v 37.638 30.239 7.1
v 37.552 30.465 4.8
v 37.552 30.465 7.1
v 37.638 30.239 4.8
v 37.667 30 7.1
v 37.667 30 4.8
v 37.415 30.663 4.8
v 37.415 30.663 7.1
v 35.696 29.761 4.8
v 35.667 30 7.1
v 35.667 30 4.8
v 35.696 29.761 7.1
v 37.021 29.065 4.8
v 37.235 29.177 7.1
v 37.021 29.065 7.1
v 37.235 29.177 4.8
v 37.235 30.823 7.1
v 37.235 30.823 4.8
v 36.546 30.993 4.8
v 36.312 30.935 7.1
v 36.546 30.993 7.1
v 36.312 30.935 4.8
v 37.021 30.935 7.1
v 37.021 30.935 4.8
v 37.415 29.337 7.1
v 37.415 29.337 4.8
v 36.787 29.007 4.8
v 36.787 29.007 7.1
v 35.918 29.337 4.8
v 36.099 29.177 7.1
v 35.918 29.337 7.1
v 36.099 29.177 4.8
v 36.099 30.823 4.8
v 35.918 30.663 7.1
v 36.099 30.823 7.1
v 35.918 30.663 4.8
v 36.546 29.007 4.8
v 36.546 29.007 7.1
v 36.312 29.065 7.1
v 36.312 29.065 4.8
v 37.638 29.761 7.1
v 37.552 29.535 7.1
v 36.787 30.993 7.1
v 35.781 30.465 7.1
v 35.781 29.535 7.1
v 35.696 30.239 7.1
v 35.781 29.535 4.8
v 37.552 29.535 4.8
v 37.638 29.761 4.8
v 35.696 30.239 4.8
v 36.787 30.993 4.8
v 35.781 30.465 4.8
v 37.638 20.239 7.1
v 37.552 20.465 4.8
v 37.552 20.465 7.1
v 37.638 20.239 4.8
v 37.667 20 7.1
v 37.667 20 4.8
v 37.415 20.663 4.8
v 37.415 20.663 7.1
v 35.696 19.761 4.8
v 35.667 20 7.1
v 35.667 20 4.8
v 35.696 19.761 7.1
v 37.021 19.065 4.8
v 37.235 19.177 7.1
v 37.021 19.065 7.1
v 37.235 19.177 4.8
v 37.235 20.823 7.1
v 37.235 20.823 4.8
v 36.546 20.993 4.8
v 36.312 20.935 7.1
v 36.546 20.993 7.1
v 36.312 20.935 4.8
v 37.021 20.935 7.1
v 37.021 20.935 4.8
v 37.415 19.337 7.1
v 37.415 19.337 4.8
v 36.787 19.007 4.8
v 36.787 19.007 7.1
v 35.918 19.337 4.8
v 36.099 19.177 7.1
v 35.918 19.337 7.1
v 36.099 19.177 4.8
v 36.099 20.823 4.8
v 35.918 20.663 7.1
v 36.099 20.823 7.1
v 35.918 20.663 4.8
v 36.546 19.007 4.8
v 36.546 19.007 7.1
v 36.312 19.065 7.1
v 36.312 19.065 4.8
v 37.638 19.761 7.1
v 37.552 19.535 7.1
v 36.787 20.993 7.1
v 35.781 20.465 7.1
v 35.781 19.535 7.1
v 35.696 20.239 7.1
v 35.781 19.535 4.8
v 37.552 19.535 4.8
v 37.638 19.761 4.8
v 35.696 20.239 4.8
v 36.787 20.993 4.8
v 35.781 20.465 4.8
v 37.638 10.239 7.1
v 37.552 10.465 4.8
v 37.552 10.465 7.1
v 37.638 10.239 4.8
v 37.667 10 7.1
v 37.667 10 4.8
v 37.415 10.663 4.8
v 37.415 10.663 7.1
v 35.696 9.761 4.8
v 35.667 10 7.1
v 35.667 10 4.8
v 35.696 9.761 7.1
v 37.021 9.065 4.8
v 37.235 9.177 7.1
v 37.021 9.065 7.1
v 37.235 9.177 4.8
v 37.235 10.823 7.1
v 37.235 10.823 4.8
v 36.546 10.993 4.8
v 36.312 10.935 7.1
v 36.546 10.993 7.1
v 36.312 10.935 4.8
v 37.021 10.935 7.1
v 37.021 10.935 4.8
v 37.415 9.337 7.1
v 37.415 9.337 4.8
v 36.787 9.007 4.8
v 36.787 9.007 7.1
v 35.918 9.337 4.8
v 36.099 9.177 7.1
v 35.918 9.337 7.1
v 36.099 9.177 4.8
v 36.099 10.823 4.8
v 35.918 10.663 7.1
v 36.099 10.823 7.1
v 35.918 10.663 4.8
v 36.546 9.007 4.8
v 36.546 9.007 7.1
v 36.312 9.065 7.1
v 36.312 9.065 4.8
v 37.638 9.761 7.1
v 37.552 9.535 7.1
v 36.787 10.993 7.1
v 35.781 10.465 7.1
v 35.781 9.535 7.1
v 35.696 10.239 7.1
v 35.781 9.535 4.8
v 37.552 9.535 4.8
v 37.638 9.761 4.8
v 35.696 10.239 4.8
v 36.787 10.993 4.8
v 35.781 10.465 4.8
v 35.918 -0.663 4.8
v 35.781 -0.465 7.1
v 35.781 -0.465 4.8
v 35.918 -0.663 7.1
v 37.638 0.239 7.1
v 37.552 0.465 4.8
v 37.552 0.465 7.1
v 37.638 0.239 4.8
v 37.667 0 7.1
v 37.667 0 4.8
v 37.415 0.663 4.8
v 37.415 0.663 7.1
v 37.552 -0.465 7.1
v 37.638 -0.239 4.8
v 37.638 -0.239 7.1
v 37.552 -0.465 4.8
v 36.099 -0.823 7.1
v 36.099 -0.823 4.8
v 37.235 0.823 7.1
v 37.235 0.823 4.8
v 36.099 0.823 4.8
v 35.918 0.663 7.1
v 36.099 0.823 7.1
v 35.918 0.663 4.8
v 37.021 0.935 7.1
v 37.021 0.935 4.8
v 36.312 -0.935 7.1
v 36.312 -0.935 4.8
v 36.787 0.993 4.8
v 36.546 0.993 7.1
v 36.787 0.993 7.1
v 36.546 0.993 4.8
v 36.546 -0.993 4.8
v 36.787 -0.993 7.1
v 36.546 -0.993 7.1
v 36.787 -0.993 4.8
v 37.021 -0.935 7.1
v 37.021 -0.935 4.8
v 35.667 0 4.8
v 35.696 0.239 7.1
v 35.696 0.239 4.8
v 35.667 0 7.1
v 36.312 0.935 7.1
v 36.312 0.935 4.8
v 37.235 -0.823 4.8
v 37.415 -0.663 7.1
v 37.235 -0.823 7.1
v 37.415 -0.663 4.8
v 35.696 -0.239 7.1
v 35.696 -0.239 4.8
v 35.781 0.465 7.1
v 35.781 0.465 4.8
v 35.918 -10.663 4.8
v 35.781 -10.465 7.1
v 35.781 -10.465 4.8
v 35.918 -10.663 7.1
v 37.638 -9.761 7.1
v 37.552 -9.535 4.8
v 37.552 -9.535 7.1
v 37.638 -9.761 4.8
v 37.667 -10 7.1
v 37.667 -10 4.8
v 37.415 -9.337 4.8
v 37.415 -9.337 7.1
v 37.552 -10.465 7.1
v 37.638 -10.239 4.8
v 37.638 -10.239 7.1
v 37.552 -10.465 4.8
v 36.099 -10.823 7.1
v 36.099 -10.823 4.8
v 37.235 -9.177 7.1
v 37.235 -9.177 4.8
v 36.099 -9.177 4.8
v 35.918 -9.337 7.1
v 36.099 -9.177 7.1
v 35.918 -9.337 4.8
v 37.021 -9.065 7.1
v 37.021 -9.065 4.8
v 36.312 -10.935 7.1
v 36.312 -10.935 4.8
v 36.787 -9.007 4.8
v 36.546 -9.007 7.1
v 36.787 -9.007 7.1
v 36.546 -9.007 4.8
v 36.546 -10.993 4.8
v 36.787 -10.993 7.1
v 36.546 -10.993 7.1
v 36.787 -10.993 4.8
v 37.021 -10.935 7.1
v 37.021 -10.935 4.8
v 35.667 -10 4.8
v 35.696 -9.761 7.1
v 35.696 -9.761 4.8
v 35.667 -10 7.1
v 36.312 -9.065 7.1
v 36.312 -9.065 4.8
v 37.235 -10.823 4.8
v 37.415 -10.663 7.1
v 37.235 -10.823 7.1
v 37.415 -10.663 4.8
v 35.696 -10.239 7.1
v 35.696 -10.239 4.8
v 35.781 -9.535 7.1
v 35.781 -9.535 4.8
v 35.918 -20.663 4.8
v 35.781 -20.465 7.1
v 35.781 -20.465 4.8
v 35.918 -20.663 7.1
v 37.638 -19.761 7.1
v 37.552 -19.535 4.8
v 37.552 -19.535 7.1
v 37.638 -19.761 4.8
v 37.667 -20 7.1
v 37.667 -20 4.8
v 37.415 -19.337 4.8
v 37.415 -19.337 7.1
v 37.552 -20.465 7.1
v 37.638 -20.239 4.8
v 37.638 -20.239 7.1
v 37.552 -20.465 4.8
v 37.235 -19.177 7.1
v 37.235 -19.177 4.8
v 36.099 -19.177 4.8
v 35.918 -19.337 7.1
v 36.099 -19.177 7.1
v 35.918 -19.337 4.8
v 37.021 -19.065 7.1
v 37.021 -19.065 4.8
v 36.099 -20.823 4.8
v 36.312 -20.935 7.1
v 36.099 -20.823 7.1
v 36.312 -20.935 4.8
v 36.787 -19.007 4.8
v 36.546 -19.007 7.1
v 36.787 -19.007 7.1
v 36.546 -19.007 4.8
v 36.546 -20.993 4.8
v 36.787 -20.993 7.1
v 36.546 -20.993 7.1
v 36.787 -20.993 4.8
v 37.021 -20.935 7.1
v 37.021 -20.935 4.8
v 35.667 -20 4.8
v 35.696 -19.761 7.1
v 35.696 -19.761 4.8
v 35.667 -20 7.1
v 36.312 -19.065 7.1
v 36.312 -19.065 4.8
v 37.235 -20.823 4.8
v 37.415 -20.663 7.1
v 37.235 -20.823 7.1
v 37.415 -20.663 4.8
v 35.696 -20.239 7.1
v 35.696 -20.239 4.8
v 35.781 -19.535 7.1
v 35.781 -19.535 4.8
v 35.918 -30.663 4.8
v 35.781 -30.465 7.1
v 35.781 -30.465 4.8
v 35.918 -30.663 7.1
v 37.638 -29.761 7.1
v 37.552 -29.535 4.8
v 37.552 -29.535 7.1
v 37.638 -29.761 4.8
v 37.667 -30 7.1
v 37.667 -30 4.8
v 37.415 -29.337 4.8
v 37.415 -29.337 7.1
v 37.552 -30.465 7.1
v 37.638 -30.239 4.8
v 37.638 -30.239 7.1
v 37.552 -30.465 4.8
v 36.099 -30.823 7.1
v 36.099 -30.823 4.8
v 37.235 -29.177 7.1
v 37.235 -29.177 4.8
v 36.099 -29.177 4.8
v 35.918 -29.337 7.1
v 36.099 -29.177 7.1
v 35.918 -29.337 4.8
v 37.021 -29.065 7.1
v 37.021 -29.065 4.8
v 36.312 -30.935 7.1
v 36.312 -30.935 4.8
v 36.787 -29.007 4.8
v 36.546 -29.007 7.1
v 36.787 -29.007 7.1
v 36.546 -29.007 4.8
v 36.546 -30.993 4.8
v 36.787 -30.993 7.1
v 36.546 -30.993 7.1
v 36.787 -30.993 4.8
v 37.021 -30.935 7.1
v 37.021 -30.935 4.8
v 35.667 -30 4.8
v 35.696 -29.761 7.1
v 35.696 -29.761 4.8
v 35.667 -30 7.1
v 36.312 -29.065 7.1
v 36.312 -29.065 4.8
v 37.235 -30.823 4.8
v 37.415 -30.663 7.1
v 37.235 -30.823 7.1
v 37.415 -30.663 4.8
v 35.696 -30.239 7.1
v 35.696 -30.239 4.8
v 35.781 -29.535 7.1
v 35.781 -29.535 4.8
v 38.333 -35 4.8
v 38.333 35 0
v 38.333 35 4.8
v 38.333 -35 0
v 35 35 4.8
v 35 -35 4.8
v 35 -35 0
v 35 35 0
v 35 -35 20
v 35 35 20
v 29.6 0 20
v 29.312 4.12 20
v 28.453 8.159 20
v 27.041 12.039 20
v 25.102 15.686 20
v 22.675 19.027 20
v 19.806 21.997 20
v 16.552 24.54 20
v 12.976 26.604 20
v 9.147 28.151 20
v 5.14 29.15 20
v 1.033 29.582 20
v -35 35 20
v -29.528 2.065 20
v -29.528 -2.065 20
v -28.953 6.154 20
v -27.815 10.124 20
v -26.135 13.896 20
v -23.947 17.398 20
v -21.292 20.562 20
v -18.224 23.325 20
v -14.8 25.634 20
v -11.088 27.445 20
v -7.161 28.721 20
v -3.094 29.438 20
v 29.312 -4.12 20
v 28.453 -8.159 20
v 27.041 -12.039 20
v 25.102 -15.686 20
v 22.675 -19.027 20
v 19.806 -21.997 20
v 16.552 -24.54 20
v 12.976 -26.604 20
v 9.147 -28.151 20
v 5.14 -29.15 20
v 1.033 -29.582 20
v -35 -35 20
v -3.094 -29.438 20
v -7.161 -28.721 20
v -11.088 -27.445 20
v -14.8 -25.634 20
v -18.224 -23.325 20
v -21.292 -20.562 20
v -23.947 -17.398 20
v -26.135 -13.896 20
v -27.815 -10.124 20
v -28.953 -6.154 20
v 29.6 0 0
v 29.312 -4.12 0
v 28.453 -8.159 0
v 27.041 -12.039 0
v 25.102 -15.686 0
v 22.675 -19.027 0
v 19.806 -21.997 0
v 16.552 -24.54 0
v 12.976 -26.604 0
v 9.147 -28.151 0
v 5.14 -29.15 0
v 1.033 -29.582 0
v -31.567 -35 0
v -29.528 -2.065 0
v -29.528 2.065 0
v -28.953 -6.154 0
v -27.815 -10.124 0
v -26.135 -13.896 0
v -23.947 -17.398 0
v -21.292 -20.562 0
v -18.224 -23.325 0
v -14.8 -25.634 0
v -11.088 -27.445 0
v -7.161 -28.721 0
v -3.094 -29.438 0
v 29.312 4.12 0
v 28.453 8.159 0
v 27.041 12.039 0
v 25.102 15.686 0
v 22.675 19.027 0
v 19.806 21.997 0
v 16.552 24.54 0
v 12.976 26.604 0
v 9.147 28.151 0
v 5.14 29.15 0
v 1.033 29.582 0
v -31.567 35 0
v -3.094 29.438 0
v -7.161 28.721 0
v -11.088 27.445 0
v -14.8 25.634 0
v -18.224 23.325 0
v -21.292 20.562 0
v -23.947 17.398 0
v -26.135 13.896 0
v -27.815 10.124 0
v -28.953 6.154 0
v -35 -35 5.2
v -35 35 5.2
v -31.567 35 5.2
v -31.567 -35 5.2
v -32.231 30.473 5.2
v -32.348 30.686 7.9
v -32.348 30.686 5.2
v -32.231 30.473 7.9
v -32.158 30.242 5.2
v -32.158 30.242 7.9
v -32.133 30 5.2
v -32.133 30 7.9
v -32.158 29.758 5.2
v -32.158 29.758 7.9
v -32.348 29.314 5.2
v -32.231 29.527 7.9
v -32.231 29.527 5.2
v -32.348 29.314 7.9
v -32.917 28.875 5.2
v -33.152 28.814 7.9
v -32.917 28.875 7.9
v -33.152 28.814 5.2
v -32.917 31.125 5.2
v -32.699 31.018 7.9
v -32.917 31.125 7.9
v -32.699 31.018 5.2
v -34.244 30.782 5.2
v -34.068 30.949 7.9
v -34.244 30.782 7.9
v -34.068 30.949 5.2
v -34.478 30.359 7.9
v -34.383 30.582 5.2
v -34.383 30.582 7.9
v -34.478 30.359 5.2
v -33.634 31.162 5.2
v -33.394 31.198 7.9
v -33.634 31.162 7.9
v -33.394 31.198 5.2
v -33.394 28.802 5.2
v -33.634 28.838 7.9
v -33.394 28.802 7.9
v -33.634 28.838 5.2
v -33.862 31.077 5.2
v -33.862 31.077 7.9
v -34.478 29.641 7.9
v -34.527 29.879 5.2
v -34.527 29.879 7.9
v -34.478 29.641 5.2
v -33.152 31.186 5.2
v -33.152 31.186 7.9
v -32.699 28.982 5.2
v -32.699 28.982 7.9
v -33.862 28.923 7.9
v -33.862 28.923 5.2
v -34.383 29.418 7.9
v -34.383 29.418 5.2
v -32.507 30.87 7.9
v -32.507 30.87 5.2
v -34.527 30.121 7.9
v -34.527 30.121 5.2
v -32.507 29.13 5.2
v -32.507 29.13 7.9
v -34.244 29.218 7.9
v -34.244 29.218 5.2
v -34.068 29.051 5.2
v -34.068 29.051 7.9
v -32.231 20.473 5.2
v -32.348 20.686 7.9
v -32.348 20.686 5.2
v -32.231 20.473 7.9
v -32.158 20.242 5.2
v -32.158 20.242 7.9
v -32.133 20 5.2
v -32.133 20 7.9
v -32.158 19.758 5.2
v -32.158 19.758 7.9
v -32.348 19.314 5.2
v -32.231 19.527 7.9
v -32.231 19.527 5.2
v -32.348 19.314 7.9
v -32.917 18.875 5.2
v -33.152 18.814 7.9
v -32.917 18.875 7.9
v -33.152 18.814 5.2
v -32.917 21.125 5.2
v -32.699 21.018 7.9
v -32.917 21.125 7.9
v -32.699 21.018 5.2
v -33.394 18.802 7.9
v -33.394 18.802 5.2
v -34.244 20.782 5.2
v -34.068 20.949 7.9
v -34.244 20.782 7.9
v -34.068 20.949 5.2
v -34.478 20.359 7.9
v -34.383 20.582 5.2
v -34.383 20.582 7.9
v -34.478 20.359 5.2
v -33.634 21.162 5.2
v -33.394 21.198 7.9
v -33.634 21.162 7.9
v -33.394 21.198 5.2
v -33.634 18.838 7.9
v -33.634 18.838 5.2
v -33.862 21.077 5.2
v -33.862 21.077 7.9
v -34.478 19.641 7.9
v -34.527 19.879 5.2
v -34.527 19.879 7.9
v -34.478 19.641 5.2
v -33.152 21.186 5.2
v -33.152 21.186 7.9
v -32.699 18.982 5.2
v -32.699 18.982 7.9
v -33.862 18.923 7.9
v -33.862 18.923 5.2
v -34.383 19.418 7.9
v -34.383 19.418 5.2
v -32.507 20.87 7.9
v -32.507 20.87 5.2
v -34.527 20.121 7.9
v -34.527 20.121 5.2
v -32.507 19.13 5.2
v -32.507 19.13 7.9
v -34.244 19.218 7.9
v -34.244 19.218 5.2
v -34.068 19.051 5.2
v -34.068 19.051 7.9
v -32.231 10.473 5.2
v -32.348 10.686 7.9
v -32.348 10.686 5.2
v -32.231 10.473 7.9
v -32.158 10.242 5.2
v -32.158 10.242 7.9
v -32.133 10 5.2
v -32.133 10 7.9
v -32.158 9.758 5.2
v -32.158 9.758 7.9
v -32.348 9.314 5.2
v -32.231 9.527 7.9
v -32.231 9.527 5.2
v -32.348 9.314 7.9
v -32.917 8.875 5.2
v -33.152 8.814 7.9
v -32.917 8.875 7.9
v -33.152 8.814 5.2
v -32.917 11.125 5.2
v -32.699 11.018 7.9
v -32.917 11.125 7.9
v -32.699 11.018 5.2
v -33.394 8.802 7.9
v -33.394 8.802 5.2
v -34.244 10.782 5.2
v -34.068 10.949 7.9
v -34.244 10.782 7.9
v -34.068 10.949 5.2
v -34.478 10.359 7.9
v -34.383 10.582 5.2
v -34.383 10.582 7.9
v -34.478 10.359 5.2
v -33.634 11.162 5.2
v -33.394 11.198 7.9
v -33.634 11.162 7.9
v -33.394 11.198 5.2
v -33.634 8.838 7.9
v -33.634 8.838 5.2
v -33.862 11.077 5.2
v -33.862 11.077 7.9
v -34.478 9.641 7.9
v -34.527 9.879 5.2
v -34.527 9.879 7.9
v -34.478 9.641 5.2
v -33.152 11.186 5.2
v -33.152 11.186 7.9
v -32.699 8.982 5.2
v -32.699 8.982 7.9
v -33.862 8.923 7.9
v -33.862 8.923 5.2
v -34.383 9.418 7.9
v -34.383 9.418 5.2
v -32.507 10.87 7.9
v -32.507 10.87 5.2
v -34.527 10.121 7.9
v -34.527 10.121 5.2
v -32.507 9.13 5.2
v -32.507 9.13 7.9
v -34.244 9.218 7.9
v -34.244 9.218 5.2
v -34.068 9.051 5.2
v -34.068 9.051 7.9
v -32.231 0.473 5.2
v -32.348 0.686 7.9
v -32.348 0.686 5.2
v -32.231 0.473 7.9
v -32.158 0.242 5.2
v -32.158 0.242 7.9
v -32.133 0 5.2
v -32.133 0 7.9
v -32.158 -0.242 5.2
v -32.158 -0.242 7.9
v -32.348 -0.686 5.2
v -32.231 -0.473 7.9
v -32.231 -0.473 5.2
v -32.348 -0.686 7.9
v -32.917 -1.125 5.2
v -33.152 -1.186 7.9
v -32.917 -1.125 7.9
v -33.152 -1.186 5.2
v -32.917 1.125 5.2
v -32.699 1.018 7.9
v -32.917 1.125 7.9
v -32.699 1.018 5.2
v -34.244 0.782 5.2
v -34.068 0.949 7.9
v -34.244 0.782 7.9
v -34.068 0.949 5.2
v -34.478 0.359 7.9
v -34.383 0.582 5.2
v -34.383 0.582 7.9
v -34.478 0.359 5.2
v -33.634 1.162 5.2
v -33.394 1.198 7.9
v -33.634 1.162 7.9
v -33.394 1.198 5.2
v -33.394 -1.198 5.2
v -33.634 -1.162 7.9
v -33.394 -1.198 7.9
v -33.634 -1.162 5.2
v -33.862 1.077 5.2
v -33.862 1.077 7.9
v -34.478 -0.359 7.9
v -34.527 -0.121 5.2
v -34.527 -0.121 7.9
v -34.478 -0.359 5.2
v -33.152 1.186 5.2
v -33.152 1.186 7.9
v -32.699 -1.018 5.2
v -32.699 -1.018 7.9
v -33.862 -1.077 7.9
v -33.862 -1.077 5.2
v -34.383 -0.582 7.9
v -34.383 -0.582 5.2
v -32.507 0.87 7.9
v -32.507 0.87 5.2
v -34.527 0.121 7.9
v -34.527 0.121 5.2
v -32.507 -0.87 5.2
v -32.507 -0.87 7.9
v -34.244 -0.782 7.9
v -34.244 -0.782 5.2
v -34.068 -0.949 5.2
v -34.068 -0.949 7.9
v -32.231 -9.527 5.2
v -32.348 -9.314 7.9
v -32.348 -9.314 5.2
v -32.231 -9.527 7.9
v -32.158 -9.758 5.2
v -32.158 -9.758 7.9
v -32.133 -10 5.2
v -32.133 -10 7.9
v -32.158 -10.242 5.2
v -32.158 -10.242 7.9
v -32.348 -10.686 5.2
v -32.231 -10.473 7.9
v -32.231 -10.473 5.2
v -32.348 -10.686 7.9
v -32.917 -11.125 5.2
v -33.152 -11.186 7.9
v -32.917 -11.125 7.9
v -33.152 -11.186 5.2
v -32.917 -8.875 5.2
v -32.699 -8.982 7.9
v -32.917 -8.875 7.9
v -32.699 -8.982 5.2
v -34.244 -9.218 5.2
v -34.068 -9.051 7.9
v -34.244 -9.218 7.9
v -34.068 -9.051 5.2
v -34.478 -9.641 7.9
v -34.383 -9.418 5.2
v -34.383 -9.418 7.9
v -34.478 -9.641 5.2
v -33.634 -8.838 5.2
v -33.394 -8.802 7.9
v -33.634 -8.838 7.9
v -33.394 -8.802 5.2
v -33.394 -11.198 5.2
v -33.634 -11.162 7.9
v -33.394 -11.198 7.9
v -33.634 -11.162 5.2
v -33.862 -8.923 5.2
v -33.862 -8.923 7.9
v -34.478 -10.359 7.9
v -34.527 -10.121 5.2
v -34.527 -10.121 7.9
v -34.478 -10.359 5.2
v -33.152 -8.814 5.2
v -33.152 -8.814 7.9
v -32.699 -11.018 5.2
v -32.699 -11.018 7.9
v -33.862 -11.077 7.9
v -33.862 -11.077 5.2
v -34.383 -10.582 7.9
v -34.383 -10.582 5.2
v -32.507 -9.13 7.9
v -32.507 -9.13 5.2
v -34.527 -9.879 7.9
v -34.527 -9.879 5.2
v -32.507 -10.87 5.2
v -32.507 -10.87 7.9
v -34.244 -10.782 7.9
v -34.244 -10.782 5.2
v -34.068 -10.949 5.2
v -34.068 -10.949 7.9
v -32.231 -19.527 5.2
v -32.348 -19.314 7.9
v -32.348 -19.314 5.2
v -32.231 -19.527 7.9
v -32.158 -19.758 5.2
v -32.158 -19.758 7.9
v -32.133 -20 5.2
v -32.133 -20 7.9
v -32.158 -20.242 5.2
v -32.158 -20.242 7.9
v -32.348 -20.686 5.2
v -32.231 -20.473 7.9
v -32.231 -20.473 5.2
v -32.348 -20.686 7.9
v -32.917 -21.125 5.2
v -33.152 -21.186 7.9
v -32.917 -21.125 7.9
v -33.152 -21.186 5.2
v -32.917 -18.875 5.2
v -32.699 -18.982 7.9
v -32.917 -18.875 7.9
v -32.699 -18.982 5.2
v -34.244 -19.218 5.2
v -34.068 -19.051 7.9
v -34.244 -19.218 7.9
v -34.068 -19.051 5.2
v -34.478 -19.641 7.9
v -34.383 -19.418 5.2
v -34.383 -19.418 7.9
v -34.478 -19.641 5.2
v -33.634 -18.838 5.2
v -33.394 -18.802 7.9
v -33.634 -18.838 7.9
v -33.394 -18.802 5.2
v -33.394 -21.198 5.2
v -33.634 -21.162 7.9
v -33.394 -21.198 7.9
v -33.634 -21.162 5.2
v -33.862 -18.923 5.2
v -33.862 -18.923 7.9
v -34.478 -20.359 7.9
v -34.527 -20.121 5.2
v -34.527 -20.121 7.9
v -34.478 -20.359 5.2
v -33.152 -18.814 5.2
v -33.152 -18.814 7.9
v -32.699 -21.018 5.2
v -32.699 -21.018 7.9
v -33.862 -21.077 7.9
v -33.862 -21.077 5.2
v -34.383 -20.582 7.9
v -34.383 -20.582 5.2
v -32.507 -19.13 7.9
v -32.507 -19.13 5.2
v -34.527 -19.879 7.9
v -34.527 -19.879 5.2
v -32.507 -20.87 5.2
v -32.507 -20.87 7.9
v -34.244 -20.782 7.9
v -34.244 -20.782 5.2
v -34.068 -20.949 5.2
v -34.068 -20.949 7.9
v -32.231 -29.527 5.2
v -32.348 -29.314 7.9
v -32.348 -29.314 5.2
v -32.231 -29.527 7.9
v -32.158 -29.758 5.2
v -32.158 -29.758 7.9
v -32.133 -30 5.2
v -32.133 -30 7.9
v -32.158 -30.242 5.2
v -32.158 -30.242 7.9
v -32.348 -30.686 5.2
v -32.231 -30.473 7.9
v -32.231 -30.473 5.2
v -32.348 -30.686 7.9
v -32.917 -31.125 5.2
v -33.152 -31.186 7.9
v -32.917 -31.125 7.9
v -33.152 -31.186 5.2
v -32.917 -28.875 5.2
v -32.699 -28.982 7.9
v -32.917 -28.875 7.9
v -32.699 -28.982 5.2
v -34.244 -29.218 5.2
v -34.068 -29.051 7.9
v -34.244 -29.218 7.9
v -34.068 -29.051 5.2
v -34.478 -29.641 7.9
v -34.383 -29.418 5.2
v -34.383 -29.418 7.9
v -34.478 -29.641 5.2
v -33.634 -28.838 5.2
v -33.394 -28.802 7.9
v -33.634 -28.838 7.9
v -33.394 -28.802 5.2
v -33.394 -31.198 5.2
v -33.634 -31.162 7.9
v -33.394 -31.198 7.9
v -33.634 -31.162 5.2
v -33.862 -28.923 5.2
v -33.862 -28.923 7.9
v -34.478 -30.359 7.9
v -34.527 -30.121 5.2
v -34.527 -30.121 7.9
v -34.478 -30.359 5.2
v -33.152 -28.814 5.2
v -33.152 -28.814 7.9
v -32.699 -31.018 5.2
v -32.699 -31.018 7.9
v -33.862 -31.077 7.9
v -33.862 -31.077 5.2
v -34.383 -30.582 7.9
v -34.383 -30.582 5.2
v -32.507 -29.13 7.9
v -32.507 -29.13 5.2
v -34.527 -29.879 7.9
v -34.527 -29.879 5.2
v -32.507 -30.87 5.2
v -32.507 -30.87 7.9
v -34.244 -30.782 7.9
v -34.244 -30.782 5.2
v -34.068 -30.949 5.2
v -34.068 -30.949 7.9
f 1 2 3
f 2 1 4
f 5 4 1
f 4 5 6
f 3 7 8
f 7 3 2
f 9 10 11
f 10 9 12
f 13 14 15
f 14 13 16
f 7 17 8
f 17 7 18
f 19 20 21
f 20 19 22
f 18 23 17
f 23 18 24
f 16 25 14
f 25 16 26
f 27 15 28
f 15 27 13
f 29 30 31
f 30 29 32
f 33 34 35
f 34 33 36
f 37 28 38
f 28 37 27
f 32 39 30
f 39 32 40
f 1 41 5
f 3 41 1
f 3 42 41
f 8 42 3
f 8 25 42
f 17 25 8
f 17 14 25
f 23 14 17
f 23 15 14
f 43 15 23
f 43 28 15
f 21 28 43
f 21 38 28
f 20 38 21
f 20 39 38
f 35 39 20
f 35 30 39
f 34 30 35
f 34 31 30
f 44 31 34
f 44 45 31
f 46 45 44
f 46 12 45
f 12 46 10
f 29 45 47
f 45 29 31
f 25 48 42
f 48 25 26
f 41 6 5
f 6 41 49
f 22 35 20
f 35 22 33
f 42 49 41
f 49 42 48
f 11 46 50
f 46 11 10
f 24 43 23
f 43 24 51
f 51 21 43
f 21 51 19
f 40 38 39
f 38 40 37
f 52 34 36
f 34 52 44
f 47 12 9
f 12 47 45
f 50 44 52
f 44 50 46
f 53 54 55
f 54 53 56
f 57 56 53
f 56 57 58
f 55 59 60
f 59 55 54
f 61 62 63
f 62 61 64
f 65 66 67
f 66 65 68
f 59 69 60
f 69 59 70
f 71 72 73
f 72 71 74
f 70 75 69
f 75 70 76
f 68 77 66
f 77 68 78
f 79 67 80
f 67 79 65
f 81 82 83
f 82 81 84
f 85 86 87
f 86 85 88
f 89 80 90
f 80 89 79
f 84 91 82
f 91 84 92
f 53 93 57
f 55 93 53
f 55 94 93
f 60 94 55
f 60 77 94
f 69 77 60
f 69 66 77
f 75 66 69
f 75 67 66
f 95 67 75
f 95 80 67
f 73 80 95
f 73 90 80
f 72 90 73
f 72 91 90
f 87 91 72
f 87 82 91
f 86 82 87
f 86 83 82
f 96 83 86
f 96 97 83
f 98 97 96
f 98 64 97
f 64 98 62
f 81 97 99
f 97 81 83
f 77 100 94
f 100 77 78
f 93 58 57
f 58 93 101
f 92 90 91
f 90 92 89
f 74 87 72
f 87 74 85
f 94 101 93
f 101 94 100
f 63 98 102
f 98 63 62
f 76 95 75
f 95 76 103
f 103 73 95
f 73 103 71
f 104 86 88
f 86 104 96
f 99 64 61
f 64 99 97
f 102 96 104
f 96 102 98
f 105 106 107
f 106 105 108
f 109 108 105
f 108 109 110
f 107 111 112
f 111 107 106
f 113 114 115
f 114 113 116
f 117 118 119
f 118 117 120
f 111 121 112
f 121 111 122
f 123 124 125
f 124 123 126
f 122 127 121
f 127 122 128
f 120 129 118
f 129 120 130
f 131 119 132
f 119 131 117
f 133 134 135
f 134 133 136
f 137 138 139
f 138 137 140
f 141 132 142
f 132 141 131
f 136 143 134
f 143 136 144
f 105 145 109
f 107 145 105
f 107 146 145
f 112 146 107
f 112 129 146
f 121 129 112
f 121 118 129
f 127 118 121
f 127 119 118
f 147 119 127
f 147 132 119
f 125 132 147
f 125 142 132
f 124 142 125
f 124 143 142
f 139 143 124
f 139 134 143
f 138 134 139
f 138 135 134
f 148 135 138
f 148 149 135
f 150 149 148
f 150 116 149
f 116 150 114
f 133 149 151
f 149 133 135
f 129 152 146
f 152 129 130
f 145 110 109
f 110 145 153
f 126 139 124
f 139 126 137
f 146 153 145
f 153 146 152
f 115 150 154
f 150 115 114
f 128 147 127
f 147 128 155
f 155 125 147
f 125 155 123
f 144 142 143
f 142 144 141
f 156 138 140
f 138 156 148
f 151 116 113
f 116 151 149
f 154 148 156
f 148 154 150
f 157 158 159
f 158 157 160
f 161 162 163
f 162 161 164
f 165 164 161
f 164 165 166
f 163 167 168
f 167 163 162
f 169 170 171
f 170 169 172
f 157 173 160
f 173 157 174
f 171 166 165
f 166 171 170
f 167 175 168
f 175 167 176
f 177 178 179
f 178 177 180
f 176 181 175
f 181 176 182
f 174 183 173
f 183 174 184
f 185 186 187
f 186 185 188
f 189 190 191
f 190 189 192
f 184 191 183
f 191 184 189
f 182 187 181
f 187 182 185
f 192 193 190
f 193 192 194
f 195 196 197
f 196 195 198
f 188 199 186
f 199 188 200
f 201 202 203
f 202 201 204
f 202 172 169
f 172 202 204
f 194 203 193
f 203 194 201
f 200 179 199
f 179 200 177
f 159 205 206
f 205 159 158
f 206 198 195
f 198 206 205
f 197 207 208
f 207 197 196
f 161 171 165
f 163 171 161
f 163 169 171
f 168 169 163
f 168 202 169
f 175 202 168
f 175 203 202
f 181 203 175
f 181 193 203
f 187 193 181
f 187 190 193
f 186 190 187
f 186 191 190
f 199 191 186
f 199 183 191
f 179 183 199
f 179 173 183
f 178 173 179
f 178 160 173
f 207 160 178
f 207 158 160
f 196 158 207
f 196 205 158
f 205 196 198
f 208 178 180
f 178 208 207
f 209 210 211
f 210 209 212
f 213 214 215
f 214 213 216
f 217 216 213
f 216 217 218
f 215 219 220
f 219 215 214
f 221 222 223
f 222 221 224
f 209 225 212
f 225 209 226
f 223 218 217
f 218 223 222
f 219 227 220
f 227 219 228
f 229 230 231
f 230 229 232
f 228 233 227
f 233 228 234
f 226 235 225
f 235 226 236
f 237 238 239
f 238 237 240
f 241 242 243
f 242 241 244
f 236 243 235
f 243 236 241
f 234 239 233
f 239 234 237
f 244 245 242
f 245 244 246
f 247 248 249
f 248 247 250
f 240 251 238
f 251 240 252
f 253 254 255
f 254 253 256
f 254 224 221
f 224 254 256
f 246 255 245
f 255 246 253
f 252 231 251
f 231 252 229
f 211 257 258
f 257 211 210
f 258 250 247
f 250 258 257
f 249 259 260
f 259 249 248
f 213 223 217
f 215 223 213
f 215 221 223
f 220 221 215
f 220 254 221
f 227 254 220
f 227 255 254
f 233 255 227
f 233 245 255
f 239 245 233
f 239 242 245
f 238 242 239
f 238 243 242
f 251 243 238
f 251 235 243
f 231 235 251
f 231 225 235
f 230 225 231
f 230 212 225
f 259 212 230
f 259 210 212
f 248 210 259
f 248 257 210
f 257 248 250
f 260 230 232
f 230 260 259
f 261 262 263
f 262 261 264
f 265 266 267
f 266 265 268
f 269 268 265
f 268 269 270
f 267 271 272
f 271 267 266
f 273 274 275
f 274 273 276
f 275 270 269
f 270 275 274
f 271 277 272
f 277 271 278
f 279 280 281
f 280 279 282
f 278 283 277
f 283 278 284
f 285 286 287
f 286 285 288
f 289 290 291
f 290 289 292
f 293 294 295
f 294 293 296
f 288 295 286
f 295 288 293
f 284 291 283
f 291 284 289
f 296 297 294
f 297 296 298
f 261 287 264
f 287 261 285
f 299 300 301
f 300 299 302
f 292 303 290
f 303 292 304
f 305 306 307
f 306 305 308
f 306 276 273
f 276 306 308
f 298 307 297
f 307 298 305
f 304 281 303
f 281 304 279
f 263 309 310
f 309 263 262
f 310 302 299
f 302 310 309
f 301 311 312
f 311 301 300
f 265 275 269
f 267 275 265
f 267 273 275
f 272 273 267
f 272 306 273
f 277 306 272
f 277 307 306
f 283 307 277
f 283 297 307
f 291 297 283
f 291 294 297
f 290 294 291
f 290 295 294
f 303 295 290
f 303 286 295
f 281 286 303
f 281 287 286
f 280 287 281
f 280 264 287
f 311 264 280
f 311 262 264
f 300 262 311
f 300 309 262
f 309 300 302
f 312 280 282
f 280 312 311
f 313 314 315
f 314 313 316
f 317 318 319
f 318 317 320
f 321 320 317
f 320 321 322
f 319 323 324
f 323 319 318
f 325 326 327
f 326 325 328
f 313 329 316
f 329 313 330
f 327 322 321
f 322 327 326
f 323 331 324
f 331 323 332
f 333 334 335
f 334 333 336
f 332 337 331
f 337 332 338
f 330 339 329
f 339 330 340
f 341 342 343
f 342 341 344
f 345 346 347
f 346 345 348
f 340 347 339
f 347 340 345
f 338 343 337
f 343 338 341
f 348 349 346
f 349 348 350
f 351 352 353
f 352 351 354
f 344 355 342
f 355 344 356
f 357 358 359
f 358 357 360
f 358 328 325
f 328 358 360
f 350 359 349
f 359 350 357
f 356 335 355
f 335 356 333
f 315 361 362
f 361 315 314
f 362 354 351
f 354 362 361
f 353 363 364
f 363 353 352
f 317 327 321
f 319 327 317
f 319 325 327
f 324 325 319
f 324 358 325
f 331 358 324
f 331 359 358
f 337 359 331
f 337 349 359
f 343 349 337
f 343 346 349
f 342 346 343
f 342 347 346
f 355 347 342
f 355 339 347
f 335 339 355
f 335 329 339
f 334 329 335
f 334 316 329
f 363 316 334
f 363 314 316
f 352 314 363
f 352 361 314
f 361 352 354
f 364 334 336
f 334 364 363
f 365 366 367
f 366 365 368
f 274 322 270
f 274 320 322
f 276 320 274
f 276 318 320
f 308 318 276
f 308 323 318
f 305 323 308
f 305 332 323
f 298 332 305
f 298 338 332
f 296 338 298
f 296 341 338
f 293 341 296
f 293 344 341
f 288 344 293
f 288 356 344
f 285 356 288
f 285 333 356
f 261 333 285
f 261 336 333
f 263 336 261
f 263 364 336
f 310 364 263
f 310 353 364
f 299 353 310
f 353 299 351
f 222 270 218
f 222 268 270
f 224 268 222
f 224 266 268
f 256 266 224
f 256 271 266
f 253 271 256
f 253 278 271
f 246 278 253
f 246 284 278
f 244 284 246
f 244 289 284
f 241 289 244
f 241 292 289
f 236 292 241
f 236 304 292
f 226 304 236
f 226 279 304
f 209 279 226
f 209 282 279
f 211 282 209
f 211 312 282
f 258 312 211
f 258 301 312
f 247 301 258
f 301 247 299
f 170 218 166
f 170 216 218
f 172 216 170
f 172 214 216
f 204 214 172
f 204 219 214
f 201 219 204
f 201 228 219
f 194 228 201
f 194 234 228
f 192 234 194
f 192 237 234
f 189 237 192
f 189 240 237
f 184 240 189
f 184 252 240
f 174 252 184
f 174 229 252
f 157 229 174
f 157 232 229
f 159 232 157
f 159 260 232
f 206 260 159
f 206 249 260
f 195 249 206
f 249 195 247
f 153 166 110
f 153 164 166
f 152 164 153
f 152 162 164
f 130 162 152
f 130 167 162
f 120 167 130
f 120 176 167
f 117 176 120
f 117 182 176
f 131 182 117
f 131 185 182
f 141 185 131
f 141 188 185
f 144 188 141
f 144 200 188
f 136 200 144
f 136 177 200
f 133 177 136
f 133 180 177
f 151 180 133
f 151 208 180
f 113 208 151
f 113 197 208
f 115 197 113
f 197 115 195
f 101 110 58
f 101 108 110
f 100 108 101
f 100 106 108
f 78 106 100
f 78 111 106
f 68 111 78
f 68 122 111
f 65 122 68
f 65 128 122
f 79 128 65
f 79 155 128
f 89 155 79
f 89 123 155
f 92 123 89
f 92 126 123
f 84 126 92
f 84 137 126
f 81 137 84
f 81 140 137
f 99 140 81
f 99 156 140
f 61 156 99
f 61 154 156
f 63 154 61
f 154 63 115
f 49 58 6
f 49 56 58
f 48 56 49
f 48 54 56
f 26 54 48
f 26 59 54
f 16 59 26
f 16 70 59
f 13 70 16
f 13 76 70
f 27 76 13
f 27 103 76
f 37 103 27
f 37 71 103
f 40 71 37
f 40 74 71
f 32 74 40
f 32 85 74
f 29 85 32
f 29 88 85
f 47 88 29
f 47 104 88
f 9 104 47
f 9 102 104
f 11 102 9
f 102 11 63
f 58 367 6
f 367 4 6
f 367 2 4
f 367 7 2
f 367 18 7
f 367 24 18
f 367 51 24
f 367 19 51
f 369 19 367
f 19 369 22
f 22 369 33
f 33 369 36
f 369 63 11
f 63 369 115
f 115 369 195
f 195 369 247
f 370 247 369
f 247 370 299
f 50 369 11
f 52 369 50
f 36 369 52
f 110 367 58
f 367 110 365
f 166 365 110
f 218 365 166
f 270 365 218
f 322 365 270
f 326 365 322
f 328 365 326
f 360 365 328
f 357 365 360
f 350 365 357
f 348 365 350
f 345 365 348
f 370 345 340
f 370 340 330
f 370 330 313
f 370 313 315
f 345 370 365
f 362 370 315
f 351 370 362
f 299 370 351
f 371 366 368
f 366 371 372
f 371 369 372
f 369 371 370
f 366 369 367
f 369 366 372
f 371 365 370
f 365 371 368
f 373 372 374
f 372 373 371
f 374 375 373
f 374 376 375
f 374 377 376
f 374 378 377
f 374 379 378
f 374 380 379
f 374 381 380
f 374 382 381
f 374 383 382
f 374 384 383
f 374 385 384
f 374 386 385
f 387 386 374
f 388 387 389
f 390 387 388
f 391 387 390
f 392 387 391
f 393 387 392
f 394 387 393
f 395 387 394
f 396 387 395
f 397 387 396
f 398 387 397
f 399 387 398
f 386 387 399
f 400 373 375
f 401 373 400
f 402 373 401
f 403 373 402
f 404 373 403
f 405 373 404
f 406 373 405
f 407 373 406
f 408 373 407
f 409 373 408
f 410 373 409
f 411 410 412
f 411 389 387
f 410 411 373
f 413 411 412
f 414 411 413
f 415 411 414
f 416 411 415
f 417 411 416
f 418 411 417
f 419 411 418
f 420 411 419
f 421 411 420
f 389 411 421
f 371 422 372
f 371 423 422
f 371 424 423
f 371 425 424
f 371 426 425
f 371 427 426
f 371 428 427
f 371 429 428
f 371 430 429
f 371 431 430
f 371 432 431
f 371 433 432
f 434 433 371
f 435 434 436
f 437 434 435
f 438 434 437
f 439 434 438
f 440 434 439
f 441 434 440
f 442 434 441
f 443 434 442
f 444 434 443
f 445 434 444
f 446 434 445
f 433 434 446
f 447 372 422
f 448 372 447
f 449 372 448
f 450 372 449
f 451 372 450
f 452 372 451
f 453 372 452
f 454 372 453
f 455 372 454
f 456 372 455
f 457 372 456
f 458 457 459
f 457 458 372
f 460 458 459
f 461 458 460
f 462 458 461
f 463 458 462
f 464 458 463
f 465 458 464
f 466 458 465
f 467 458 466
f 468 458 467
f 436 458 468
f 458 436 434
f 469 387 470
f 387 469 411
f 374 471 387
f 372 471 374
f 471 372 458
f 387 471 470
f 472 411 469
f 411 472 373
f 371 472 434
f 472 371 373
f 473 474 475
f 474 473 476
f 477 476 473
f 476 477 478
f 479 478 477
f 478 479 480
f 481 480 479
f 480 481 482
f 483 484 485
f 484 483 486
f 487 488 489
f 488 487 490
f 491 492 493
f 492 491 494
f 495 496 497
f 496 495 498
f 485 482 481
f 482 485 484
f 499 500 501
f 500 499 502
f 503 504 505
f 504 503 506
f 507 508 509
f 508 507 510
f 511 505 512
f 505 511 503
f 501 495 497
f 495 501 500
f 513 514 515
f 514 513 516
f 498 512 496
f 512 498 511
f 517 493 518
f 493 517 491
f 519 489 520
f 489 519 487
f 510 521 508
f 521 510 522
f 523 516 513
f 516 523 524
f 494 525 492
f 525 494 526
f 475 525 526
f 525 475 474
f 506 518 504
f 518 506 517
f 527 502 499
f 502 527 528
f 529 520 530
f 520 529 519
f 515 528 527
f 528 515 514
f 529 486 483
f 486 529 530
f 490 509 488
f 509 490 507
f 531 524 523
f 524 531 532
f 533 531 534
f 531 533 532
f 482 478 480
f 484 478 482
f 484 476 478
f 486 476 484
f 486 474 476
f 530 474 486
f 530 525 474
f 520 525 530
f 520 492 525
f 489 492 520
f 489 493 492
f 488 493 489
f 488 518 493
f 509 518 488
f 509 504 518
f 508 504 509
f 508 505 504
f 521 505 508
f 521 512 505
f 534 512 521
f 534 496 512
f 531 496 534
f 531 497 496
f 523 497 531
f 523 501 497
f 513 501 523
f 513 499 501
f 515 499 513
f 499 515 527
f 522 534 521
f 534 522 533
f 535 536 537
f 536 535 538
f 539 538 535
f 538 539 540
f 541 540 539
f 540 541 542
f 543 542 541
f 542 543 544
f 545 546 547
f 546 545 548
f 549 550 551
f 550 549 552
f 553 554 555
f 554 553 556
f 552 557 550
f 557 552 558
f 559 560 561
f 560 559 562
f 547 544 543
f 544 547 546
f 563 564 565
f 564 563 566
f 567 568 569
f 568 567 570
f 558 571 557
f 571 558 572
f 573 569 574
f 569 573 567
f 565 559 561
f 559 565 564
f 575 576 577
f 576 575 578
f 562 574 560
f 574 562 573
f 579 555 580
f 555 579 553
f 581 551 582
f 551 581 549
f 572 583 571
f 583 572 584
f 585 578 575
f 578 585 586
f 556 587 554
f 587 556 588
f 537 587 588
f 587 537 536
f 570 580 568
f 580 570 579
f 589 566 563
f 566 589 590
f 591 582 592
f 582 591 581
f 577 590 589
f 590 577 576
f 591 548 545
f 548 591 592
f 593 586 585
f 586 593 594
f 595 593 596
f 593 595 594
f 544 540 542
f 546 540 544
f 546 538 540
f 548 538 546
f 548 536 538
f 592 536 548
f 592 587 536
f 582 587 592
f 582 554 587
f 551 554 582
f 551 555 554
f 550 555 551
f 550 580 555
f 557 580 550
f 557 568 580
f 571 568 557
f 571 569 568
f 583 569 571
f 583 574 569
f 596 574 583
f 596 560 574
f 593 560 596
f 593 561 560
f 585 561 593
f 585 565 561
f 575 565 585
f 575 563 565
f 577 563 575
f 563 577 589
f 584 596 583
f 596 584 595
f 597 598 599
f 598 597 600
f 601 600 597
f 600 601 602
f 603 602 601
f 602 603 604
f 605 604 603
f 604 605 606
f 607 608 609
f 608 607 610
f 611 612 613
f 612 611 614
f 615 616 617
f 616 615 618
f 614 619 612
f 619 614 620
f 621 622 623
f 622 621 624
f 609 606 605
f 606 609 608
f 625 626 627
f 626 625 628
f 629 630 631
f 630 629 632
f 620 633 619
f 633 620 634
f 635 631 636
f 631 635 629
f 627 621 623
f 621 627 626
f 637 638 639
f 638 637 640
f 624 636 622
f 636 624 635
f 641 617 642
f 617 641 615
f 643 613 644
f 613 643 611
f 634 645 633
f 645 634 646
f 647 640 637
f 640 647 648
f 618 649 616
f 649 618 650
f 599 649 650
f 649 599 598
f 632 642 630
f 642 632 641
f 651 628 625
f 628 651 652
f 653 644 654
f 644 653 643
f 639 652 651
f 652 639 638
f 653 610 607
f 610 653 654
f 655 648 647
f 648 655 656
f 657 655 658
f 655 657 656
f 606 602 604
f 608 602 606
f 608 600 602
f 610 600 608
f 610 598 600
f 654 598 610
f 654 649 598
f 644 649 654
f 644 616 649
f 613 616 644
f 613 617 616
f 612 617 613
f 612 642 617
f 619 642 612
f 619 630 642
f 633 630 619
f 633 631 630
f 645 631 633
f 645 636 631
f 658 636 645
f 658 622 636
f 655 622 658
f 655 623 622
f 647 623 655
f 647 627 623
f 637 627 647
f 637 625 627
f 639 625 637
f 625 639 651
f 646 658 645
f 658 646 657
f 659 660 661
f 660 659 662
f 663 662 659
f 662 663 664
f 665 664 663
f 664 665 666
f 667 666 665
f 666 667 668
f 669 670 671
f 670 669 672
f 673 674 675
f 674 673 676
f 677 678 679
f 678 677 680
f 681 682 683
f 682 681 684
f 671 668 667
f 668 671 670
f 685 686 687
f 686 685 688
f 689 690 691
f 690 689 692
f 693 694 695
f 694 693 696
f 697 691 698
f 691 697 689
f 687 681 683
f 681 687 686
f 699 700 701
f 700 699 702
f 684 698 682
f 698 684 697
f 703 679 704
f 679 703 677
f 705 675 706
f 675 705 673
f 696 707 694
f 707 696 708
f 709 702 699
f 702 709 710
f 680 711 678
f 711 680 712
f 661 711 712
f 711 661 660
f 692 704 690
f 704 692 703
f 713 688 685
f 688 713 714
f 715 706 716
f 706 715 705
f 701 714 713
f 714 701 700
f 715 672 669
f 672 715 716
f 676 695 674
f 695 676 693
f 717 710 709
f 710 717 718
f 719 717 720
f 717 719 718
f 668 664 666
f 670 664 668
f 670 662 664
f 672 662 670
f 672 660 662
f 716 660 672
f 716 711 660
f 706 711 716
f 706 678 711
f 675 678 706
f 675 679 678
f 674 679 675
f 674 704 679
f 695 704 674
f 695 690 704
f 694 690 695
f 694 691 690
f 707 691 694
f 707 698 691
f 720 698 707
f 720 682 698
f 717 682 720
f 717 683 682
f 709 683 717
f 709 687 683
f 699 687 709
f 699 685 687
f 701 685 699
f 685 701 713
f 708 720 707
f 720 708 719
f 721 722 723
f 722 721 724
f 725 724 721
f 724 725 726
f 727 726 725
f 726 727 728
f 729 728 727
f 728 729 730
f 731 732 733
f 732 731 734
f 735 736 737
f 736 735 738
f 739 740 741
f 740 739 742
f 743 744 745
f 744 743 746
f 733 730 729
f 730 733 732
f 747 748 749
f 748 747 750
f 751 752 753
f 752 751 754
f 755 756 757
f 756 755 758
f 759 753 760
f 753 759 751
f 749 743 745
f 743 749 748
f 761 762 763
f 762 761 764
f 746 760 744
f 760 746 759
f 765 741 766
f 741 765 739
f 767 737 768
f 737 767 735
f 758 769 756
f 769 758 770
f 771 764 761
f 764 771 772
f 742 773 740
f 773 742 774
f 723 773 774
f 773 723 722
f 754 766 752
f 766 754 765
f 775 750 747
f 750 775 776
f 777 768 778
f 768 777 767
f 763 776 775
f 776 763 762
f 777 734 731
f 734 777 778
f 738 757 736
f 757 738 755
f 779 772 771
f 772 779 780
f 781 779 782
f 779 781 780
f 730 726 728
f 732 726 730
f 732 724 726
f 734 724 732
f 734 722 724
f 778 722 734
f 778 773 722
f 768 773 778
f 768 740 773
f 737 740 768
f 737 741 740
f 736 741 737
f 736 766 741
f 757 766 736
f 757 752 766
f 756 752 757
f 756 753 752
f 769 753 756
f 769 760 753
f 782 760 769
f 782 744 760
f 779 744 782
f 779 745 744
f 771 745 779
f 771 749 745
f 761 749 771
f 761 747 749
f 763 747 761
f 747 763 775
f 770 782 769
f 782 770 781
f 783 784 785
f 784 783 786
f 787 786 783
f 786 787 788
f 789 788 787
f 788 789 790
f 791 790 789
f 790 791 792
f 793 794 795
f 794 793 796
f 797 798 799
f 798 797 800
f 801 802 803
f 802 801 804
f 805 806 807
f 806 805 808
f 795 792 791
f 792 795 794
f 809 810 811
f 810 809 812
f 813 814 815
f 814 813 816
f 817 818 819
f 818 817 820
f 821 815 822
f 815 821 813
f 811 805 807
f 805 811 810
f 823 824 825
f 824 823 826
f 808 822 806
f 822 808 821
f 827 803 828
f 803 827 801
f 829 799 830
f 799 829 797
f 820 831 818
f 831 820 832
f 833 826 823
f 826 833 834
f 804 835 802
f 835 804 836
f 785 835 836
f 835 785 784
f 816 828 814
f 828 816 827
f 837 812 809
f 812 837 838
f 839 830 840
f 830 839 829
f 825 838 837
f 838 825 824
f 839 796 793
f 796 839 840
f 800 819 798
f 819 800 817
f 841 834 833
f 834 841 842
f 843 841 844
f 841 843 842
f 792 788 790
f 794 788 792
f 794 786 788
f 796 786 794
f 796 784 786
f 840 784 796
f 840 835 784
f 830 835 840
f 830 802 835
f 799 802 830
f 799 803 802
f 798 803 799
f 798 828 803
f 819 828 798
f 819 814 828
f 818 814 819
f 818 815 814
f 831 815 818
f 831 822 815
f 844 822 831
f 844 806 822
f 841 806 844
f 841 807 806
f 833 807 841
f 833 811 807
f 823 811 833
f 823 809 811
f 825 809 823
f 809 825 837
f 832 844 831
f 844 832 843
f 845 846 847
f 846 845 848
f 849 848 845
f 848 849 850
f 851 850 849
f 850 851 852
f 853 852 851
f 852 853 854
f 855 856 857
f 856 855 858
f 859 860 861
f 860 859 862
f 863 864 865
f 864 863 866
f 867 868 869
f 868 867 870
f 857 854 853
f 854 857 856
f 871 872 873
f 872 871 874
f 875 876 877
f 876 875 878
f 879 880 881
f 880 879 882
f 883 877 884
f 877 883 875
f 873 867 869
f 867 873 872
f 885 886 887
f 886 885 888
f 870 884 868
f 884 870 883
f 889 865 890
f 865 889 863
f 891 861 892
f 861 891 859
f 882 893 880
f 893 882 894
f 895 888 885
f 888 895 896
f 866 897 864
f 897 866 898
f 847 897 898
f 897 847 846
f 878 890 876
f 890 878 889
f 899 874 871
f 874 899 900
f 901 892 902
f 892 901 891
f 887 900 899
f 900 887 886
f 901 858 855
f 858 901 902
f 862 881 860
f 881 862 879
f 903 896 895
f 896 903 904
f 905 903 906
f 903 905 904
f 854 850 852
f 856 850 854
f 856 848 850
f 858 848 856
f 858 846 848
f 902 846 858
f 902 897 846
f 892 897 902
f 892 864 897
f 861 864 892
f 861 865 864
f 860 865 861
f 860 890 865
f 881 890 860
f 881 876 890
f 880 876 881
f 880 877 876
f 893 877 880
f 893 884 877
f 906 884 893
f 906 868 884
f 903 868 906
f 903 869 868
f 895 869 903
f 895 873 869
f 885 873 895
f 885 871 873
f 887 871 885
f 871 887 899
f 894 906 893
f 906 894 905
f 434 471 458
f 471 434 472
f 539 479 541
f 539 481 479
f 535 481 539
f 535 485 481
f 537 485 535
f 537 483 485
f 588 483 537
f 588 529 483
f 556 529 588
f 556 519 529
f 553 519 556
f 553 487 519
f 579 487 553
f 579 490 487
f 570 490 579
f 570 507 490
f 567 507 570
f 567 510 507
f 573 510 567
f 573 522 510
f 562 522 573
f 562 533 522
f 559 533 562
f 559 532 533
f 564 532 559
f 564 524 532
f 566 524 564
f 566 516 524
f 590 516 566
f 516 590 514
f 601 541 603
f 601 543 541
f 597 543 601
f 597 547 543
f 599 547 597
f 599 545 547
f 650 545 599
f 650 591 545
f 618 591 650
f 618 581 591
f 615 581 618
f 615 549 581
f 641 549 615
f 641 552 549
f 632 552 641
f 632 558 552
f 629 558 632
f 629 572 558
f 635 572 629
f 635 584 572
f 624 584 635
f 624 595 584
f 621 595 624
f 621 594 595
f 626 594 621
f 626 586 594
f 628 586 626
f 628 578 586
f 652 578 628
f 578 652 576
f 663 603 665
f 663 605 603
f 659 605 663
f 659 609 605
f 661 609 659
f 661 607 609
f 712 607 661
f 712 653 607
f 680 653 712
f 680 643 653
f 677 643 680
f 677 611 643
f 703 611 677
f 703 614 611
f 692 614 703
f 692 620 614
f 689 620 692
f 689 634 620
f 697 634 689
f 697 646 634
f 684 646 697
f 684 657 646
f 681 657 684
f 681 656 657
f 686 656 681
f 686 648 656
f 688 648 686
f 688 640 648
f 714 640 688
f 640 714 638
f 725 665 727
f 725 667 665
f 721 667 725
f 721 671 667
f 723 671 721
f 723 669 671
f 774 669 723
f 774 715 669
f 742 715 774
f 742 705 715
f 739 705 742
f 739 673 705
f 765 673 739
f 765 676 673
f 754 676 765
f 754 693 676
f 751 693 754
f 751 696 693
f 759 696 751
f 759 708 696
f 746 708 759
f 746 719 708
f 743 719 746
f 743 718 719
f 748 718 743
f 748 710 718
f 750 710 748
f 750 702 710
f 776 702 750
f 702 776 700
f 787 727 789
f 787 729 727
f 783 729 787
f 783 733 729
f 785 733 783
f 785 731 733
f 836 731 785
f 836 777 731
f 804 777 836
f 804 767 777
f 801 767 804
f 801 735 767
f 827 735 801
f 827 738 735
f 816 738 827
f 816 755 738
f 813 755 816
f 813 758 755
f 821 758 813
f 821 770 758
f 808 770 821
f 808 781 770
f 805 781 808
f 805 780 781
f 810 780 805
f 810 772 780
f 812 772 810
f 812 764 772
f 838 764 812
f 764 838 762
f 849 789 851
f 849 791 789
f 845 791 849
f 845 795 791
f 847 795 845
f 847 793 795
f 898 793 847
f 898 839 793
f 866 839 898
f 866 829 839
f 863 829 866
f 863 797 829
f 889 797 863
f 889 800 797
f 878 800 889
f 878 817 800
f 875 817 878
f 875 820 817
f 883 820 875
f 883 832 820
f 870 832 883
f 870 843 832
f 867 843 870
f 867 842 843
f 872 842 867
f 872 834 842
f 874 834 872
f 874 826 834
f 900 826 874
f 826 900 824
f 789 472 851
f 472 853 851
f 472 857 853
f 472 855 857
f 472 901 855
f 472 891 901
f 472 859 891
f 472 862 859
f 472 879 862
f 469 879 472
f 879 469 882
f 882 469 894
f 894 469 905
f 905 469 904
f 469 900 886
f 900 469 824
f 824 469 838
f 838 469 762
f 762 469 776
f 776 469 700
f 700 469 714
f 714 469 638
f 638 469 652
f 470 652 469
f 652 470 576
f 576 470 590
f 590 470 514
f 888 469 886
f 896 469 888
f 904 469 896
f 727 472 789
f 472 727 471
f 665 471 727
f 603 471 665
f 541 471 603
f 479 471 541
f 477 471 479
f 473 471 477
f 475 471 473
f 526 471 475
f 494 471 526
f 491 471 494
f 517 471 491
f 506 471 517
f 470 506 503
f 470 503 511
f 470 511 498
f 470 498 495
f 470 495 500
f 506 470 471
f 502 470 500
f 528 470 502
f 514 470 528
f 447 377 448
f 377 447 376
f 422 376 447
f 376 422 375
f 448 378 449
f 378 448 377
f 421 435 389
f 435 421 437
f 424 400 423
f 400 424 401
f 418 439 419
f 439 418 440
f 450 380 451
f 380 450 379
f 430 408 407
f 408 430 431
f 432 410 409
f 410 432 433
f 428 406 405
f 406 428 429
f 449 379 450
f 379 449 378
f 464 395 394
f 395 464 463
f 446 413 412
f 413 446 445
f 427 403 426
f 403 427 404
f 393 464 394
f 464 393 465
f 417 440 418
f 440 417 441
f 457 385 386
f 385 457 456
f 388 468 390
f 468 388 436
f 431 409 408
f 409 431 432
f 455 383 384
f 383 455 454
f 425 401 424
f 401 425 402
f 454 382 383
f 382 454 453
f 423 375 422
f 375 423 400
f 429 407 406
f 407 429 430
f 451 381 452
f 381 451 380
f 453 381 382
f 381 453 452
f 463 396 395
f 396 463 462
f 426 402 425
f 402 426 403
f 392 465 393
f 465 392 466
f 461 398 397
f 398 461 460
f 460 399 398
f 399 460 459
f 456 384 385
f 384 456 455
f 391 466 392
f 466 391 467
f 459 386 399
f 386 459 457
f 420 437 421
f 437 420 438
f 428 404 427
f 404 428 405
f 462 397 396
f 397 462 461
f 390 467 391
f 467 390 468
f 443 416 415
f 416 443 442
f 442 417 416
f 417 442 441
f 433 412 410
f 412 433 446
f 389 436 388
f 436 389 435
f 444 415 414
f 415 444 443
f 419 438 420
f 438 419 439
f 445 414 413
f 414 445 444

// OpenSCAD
// file: ../base.scad
// The x-axis has the connection to the other units
// There is one connection peg per x
// Minimum unit is x=1, y=1, z=1
// If you have x=1, then the x-axis will be extended 
// with 1/3 for the connectors 
// the female version will can still be used and therefore
// counted within the unit

/* [Setup Parameters] */
$fa = 8;
$fs = 0.25;


module base(x,y,z) {
    u = 10;
    t = u;

    width = u*x;
    depth = u*y;
    height = t*z;

    margin = 0.2;

    male_connection_d = 2;
    female_connection_d = male_connection_d+margin*2;
    connector_width = u/3;
    connector_height = t/2;

    module connector(width, height, cylinder_height, cylinder_d) {
        translate([0, 0, 0])
        union() {
            translate([0, 0, height/2])
            cube([width, depth, height], center=true);
            for (i = [1:1:y]) {
                translate([0, depth/2+u/2-(u)*i, height-0.1])
                cylinder(h=cylinder_height+0.1, d=cylinder_d);
            }
        }
    }

    module male_connector() {
        width = connector_width;
        height = connector_height-margin;
        cylinder_height = connector_height/2-margin;
        cylinder_d = male_connection_d;

        connector(width, height, cylinder_height, cylinder_d);
    }

    module inverted_female_connecor() {
        width = connector_width+margin;
        height = connector_height+margin;
        cylinder_height = connector_height/2+margin;
        cylinder_d = female_connection_d;

        connector(width, height, cylinder_height, cylinder_d);
    }

    difference() {
        union() {
            translate([0, 0, height/2])
            cube([width, depth, height], center=true);
            translate([width/2+connector_width/2, 0, 0])
            male_connector();
        }
        union() {
            translate([-width/2+connector_width/2, 0, 0])
            inverted_female_connecor();
        }
    }
}


//base(2,7,2);

module connector(y) {
    u = 10;
}
// main file
include <../base.scad>

soldering_cleaner_d = 59.2;

xunits = 7;
yunits = 7;
zunits = 2;

difference() {
    base(xunits,yunits,zunits);

    cylinder(h=40, d=soldering_cleaner_d);
}
